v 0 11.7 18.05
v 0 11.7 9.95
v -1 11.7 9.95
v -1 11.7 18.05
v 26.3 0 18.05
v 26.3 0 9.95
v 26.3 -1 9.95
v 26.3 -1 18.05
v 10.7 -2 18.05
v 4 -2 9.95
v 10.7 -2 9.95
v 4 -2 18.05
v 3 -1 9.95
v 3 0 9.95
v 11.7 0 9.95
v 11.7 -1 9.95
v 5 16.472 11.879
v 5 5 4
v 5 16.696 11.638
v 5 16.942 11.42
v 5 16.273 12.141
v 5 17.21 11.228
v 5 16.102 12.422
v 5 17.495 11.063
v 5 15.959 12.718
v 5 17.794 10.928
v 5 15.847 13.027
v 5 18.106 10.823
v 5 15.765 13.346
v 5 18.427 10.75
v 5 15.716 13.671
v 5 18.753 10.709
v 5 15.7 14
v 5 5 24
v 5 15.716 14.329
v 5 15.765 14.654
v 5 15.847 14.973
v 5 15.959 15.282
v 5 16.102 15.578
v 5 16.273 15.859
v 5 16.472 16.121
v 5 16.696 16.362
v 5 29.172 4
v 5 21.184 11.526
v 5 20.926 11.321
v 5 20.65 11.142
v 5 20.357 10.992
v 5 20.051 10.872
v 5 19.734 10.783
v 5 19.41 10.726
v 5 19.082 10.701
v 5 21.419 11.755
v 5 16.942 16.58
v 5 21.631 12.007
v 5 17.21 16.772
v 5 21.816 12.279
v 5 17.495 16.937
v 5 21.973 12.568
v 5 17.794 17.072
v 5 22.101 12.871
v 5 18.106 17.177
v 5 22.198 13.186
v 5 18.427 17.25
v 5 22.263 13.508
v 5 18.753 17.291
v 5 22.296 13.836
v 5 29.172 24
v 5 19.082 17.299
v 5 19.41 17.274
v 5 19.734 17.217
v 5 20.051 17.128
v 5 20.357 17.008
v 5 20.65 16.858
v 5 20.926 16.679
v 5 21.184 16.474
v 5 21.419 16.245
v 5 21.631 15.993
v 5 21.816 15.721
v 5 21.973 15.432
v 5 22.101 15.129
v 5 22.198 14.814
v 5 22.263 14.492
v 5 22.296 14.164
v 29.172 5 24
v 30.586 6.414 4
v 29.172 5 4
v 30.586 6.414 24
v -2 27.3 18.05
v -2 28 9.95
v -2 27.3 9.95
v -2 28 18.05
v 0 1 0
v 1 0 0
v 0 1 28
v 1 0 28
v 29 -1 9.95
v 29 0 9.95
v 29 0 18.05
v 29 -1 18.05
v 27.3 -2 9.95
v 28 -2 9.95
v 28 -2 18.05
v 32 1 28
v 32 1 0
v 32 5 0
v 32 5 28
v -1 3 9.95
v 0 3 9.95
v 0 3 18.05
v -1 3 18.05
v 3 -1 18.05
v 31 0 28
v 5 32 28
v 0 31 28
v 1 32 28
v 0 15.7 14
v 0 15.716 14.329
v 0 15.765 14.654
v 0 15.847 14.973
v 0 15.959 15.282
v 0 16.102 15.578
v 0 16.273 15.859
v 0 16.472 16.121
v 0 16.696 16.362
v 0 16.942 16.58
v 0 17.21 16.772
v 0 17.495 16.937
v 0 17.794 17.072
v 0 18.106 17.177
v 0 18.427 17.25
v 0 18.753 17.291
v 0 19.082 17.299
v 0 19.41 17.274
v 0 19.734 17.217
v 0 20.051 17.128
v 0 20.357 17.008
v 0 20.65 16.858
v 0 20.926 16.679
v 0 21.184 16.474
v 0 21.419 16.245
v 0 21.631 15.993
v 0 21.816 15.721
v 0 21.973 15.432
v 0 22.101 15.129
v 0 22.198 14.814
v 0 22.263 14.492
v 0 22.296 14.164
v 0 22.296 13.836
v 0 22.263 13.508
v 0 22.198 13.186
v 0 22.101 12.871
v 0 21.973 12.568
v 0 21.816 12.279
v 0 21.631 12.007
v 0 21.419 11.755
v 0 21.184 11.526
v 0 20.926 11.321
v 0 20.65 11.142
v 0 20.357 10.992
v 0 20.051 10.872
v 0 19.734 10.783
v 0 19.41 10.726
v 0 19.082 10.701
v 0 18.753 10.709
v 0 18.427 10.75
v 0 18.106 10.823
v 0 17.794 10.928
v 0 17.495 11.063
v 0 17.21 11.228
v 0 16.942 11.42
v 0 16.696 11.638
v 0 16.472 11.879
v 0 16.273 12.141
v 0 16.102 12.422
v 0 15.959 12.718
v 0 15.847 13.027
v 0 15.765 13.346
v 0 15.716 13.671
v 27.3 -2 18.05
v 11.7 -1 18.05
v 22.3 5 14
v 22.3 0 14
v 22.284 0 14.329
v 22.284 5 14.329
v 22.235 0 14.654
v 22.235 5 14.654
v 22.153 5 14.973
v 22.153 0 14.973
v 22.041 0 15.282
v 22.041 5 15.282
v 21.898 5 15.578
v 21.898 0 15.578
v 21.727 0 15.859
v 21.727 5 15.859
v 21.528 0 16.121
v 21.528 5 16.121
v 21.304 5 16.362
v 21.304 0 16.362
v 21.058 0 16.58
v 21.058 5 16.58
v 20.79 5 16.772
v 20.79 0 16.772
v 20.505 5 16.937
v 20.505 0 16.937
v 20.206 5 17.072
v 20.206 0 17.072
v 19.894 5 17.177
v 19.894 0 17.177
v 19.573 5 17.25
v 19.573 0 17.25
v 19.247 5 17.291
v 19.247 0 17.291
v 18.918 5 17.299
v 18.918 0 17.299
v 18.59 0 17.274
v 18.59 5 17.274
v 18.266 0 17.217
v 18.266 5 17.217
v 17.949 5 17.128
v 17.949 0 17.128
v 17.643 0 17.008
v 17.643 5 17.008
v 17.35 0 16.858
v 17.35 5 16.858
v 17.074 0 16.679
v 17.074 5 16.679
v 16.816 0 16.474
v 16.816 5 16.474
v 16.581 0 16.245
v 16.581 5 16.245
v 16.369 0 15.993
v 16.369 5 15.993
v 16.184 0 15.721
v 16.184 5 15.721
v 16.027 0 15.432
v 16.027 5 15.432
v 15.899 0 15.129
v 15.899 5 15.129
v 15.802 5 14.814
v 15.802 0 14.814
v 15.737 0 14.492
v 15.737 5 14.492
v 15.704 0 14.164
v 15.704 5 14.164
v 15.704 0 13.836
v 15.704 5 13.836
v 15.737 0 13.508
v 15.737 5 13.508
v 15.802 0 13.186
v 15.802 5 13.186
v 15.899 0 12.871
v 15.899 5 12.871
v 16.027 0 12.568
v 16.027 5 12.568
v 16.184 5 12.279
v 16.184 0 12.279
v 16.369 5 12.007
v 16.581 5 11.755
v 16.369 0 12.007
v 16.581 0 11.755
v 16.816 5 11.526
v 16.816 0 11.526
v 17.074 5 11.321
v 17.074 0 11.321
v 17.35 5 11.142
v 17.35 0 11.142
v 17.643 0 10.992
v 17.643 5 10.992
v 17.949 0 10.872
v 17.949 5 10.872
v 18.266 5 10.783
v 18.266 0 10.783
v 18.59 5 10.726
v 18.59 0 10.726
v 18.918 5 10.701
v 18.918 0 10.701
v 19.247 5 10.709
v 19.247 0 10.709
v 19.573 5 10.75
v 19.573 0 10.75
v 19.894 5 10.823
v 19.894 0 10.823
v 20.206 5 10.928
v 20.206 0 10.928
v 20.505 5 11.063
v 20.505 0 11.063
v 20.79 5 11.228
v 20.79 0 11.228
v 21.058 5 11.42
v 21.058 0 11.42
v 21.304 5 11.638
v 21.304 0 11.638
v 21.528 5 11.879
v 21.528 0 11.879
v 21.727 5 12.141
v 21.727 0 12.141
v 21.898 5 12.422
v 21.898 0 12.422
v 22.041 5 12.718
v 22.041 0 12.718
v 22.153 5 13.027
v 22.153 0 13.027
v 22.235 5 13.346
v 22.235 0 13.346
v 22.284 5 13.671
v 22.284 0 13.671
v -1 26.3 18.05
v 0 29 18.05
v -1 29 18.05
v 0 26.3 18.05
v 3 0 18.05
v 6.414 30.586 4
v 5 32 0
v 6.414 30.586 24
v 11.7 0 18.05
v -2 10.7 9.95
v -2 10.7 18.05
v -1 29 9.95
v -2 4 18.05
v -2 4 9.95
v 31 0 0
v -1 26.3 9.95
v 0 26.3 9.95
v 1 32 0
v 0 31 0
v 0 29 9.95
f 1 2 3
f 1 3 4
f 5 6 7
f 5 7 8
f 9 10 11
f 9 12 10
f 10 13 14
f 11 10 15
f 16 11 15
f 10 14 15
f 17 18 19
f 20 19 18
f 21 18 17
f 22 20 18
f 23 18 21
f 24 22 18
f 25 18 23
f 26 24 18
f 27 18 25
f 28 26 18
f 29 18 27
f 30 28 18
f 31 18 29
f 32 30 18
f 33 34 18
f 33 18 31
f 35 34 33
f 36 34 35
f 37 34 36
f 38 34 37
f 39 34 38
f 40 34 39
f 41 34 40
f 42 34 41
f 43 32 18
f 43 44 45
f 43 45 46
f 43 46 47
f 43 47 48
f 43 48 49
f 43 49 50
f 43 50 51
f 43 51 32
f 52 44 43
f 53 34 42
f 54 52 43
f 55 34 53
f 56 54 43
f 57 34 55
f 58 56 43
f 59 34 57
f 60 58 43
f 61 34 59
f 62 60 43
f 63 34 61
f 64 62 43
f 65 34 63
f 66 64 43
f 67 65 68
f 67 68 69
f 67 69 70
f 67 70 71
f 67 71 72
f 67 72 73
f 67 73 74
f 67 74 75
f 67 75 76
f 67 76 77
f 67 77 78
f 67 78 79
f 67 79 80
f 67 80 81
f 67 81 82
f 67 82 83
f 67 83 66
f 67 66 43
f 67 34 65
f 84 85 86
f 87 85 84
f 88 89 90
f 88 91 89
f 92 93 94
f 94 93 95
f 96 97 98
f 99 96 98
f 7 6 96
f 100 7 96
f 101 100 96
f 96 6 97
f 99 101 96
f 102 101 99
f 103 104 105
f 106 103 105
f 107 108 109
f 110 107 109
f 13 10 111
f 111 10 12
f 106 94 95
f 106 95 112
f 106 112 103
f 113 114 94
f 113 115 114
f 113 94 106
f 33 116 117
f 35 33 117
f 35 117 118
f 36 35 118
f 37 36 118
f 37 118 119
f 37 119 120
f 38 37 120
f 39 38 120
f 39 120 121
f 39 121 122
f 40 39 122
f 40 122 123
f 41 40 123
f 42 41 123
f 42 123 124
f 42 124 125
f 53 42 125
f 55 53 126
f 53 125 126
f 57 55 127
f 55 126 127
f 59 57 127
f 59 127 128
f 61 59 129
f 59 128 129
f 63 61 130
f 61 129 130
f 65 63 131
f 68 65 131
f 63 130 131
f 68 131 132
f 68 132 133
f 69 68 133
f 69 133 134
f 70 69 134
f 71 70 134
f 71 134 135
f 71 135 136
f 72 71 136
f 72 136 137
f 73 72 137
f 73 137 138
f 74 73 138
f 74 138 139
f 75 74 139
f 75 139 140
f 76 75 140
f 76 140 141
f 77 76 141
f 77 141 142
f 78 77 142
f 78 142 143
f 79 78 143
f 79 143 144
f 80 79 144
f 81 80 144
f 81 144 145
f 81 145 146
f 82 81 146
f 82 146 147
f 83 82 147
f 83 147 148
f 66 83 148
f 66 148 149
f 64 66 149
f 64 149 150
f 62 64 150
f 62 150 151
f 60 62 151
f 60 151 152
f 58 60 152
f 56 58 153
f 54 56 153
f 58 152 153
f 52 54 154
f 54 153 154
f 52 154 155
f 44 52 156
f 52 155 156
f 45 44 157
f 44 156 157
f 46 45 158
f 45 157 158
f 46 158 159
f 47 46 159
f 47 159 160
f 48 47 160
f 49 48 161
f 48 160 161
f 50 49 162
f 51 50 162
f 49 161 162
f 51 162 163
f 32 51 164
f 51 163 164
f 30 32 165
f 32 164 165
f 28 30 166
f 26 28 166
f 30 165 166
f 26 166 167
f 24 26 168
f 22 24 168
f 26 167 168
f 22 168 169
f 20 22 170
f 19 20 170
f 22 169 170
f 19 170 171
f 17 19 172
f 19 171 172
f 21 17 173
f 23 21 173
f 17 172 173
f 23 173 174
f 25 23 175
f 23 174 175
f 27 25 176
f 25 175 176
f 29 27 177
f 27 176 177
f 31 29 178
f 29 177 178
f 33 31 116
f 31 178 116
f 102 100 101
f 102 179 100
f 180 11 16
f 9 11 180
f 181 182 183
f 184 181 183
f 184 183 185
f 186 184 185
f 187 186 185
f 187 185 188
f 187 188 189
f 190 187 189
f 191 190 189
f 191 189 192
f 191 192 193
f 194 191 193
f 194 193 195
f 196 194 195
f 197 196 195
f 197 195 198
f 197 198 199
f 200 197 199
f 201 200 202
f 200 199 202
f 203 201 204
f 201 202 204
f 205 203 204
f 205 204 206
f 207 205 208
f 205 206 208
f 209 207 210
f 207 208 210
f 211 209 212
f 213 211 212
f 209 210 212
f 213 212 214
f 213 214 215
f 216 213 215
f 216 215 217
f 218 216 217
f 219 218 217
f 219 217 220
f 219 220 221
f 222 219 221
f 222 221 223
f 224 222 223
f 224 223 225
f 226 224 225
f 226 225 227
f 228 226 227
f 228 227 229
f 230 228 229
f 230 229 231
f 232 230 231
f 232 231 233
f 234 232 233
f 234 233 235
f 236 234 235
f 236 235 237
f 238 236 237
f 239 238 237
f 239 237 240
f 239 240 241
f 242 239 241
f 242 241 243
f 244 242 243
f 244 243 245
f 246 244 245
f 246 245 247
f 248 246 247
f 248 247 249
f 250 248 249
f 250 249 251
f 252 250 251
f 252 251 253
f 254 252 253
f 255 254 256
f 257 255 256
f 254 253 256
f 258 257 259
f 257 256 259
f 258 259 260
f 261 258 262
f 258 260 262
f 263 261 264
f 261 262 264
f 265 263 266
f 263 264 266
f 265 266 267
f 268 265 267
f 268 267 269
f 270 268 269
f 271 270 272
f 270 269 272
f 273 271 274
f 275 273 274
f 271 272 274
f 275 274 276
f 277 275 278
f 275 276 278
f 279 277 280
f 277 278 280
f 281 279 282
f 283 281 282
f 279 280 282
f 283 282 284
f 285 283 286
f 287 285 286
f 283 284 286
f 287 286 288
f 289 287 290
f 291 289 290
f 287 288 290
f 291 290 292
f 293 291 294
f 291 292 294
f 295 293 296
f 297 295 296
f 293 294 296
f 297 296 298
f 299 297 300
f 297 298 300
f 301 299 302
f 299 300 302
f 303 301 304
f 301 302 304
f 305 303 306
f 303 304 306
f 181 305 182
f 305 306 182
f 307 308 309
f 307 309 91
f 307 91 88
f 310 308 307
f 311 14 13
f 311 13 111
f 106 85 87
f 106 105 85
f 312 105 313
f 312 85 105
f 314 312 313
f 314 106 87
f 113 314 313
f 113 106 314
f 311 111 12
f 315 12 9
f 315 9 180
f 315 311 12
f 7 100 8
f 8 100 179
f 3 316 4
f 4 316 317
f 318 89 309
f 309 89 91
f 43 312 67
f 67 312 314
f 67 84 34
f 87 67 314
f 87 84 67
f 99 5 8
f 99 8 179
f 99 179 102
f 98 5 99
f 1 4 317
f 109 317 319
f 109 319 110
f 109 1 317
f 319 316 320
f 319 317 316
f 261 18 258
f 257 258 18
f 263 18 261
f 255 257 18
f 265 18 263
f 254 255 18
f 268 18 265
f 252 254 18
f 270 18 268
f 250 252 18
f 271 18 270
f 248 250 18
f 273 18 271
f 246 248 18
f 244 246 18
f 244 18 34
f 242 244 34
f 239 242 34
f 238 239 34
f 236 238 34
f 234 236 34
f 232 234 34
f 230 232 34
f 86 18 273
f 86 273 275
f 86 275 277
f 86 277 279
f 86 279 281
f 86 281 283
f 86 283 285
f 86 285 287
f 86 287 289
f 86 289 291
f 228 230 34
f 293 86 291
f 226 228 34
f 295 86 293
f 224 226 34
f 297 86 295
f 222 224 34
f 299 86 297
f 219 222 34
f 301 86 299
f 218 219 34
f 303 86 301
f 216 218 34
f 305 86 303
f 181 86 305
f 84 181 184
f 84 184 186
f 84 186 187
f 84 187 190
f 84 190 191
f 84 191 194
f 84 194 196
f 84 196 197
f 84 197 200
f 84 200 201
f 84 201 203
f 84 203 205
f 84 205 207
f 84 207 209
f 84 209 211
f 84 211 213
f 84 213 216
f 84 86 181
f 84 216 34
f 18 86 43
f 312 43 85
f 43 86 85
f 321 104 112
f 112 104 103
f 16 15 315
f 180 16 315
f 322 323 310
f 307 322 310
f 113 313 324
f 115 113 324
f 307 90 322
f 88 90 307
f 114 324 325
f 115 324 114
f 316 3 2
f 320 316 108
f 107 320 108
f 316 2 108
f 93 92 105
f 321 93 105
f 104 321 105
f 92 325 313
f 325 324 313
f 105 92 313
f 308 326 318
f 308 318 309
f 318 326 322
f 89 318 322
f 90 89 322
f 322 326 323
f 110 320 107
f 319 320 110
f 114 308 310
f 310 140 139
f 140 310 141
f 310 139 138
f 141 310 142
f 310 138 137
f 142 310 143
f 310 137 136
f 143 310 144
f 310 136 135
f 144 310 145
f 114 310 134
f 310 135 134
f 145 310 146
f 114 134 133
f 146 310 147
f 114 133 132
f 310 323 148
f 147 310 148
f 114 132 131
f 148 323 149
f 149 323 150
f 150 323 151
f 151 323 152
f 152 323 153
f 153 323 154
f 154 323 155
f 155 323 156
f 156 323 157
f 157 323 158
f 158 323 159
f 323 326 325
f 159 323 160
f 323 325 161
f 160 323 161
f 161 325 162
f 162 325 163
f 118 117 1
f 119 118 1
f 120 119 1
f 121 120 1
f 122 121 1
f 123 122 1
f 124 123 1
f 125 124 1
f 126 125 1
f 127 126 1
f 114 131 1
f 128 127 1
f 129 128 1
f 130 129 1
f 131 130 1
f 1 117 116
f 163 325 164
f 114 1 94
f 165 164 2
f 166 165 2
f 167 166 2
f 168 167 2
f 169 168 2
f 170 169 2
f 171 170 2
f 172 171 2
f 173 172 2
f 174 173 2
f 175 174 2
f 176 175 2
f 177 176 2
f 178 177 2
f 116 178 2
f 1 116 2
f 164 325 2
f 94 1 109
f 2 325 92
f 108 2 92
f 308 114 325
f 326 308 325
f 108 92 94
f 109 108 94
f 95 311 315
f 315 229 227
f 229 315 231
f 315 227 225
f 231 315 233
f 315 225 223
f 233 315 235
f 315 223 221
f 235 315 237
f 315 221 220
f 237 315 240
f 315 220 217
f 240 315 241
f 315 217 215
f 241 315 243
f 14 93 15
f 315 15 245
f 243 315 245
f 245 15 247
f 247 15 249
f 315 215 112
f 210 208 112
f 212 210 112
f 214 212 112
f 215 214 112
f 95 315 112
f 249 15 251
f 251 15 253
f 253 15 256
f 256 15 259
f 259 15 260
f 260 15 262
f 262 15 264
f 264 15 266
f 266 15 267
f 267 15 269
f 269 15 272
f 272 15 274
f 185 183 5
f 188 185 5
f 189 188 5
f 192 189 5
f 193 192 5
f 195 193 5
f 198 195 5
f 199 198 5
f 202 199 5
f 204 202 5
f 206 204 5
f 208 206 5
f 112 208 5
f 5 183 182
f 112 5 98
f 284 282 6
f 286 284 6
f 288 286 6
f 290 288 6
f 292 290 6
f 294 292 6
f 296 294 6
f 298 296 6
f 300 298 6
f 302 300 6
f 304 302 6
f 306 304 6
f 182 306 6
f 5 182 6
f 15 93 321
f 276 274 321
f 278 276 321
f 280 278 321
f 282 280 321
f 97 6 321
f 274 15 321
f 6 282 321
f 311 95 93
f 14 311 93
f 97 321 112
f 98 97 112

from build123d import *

# Parameters (mm, degrees)
F1_DEPTH  = 28
F2_W      = 27
F2_H      = 20
F3_DEPTH  = 27
F5_D      = 6.6
F7_D      = 6.6
F8_W      = 2.7
F8_H      = 8.1
F8_W_2    = 8.7
F9_DEPTH  = 2
F10_W     = 2.7
F10_H     = 8.1
F10_W_2   = 8.7
F11_DEPTH = 2
F12_SIZE  = 1
F13_W     = 2
F13_H     = 20
F14_DEPTH = 2.5


with BuildPart() as f1:
    # F0 (on Top) → F1 (new body)
    with BuildSketch(Plane.XY):
        Polygon((0, 32), (0, 0), (32, 0), (32, 5), (5, 32), align=None)
    extrude(amount=F1_DEPTH)

    # F2 (on face) → F3 (cut, through all)
    with BuildSketch(Plane.YZ.offset(32)):
        with Locations((18.5, 14)):
            Rectangle(F2_W, F2_H)
    extrude(amount=-F3_DEPTH, mode=Mode.SUBTRACT)

    # F5 (through all)
    with Locations(Plane.YZ.offset(5)):
        with Locations((19, 14)):
            Hole(F5_D / 2)

    # F7 (through all)
    with Locations(Plane(origin=(0, 5, 0), x_dir=(-1, 0, 0), z_dir=(0, 1, 0))):
        with Locations((-19, 14)):
            Hole(F7_D / 2)

    # F8 (on face) → F9 (join)
    with BuildSketch(Plane.XZ):
        with Locations((27.65, 14)):
            Rectangle(F8_W, F8_H)
        with Locations((7.35, 14)):
            Rectangle(F8_W_2, F8_H)
    extrude(amount=F9_DEPTH)

    # F10 (on face) → F11 (join)
    with BuildSketch(Plane(origin=(0, 0, 0), x_dir=(0, -1, 0), z_dir=(-1, 0, 0))):
        with Locations((-27.65, 14)):
            Rectangle(F10_W, F10_H)
        with Locations((-7.35, 14)):
            Rectangle(F10_W_2, F10_H)
    extrude(amount=F11_DEPTH)

    # F12
    f12_edges = [f1.edges().sort_by_distance(p)[0] for p in [
        (0, 32, 14),
        (-2, 29, 14),
        (-2, 26.3, 14),
        (-2, 11.7, 14),
        (-2, 3, 14),
        (0, 0, 14),
        (3, -2, 14),
        (11.7, -2, 14),
        (26.3, -2, 14),
        (29, -2, 14),
        (32, 0, 14),
    ]]
    chamfer(f12_edges, length=F12_SIZE)

    # F13 (on face) → F14 (join)
    with BuildSketch(Plane(origin=(18.5, 18.5, 0), x_dir=(-0.7071067812, 0.7071067812, 0), z_dir=(0.7071067812, 0.7071067812, 0))):
        with Locations((-18.091883092, 14)):
            Rectangle(F13_W, F13_H)
        with Locations((18.091883092, 14)):
            Rectangle(F13_W, F13_H)
    extrude(amount=-F14_DEPTH)


solid = f1.part
